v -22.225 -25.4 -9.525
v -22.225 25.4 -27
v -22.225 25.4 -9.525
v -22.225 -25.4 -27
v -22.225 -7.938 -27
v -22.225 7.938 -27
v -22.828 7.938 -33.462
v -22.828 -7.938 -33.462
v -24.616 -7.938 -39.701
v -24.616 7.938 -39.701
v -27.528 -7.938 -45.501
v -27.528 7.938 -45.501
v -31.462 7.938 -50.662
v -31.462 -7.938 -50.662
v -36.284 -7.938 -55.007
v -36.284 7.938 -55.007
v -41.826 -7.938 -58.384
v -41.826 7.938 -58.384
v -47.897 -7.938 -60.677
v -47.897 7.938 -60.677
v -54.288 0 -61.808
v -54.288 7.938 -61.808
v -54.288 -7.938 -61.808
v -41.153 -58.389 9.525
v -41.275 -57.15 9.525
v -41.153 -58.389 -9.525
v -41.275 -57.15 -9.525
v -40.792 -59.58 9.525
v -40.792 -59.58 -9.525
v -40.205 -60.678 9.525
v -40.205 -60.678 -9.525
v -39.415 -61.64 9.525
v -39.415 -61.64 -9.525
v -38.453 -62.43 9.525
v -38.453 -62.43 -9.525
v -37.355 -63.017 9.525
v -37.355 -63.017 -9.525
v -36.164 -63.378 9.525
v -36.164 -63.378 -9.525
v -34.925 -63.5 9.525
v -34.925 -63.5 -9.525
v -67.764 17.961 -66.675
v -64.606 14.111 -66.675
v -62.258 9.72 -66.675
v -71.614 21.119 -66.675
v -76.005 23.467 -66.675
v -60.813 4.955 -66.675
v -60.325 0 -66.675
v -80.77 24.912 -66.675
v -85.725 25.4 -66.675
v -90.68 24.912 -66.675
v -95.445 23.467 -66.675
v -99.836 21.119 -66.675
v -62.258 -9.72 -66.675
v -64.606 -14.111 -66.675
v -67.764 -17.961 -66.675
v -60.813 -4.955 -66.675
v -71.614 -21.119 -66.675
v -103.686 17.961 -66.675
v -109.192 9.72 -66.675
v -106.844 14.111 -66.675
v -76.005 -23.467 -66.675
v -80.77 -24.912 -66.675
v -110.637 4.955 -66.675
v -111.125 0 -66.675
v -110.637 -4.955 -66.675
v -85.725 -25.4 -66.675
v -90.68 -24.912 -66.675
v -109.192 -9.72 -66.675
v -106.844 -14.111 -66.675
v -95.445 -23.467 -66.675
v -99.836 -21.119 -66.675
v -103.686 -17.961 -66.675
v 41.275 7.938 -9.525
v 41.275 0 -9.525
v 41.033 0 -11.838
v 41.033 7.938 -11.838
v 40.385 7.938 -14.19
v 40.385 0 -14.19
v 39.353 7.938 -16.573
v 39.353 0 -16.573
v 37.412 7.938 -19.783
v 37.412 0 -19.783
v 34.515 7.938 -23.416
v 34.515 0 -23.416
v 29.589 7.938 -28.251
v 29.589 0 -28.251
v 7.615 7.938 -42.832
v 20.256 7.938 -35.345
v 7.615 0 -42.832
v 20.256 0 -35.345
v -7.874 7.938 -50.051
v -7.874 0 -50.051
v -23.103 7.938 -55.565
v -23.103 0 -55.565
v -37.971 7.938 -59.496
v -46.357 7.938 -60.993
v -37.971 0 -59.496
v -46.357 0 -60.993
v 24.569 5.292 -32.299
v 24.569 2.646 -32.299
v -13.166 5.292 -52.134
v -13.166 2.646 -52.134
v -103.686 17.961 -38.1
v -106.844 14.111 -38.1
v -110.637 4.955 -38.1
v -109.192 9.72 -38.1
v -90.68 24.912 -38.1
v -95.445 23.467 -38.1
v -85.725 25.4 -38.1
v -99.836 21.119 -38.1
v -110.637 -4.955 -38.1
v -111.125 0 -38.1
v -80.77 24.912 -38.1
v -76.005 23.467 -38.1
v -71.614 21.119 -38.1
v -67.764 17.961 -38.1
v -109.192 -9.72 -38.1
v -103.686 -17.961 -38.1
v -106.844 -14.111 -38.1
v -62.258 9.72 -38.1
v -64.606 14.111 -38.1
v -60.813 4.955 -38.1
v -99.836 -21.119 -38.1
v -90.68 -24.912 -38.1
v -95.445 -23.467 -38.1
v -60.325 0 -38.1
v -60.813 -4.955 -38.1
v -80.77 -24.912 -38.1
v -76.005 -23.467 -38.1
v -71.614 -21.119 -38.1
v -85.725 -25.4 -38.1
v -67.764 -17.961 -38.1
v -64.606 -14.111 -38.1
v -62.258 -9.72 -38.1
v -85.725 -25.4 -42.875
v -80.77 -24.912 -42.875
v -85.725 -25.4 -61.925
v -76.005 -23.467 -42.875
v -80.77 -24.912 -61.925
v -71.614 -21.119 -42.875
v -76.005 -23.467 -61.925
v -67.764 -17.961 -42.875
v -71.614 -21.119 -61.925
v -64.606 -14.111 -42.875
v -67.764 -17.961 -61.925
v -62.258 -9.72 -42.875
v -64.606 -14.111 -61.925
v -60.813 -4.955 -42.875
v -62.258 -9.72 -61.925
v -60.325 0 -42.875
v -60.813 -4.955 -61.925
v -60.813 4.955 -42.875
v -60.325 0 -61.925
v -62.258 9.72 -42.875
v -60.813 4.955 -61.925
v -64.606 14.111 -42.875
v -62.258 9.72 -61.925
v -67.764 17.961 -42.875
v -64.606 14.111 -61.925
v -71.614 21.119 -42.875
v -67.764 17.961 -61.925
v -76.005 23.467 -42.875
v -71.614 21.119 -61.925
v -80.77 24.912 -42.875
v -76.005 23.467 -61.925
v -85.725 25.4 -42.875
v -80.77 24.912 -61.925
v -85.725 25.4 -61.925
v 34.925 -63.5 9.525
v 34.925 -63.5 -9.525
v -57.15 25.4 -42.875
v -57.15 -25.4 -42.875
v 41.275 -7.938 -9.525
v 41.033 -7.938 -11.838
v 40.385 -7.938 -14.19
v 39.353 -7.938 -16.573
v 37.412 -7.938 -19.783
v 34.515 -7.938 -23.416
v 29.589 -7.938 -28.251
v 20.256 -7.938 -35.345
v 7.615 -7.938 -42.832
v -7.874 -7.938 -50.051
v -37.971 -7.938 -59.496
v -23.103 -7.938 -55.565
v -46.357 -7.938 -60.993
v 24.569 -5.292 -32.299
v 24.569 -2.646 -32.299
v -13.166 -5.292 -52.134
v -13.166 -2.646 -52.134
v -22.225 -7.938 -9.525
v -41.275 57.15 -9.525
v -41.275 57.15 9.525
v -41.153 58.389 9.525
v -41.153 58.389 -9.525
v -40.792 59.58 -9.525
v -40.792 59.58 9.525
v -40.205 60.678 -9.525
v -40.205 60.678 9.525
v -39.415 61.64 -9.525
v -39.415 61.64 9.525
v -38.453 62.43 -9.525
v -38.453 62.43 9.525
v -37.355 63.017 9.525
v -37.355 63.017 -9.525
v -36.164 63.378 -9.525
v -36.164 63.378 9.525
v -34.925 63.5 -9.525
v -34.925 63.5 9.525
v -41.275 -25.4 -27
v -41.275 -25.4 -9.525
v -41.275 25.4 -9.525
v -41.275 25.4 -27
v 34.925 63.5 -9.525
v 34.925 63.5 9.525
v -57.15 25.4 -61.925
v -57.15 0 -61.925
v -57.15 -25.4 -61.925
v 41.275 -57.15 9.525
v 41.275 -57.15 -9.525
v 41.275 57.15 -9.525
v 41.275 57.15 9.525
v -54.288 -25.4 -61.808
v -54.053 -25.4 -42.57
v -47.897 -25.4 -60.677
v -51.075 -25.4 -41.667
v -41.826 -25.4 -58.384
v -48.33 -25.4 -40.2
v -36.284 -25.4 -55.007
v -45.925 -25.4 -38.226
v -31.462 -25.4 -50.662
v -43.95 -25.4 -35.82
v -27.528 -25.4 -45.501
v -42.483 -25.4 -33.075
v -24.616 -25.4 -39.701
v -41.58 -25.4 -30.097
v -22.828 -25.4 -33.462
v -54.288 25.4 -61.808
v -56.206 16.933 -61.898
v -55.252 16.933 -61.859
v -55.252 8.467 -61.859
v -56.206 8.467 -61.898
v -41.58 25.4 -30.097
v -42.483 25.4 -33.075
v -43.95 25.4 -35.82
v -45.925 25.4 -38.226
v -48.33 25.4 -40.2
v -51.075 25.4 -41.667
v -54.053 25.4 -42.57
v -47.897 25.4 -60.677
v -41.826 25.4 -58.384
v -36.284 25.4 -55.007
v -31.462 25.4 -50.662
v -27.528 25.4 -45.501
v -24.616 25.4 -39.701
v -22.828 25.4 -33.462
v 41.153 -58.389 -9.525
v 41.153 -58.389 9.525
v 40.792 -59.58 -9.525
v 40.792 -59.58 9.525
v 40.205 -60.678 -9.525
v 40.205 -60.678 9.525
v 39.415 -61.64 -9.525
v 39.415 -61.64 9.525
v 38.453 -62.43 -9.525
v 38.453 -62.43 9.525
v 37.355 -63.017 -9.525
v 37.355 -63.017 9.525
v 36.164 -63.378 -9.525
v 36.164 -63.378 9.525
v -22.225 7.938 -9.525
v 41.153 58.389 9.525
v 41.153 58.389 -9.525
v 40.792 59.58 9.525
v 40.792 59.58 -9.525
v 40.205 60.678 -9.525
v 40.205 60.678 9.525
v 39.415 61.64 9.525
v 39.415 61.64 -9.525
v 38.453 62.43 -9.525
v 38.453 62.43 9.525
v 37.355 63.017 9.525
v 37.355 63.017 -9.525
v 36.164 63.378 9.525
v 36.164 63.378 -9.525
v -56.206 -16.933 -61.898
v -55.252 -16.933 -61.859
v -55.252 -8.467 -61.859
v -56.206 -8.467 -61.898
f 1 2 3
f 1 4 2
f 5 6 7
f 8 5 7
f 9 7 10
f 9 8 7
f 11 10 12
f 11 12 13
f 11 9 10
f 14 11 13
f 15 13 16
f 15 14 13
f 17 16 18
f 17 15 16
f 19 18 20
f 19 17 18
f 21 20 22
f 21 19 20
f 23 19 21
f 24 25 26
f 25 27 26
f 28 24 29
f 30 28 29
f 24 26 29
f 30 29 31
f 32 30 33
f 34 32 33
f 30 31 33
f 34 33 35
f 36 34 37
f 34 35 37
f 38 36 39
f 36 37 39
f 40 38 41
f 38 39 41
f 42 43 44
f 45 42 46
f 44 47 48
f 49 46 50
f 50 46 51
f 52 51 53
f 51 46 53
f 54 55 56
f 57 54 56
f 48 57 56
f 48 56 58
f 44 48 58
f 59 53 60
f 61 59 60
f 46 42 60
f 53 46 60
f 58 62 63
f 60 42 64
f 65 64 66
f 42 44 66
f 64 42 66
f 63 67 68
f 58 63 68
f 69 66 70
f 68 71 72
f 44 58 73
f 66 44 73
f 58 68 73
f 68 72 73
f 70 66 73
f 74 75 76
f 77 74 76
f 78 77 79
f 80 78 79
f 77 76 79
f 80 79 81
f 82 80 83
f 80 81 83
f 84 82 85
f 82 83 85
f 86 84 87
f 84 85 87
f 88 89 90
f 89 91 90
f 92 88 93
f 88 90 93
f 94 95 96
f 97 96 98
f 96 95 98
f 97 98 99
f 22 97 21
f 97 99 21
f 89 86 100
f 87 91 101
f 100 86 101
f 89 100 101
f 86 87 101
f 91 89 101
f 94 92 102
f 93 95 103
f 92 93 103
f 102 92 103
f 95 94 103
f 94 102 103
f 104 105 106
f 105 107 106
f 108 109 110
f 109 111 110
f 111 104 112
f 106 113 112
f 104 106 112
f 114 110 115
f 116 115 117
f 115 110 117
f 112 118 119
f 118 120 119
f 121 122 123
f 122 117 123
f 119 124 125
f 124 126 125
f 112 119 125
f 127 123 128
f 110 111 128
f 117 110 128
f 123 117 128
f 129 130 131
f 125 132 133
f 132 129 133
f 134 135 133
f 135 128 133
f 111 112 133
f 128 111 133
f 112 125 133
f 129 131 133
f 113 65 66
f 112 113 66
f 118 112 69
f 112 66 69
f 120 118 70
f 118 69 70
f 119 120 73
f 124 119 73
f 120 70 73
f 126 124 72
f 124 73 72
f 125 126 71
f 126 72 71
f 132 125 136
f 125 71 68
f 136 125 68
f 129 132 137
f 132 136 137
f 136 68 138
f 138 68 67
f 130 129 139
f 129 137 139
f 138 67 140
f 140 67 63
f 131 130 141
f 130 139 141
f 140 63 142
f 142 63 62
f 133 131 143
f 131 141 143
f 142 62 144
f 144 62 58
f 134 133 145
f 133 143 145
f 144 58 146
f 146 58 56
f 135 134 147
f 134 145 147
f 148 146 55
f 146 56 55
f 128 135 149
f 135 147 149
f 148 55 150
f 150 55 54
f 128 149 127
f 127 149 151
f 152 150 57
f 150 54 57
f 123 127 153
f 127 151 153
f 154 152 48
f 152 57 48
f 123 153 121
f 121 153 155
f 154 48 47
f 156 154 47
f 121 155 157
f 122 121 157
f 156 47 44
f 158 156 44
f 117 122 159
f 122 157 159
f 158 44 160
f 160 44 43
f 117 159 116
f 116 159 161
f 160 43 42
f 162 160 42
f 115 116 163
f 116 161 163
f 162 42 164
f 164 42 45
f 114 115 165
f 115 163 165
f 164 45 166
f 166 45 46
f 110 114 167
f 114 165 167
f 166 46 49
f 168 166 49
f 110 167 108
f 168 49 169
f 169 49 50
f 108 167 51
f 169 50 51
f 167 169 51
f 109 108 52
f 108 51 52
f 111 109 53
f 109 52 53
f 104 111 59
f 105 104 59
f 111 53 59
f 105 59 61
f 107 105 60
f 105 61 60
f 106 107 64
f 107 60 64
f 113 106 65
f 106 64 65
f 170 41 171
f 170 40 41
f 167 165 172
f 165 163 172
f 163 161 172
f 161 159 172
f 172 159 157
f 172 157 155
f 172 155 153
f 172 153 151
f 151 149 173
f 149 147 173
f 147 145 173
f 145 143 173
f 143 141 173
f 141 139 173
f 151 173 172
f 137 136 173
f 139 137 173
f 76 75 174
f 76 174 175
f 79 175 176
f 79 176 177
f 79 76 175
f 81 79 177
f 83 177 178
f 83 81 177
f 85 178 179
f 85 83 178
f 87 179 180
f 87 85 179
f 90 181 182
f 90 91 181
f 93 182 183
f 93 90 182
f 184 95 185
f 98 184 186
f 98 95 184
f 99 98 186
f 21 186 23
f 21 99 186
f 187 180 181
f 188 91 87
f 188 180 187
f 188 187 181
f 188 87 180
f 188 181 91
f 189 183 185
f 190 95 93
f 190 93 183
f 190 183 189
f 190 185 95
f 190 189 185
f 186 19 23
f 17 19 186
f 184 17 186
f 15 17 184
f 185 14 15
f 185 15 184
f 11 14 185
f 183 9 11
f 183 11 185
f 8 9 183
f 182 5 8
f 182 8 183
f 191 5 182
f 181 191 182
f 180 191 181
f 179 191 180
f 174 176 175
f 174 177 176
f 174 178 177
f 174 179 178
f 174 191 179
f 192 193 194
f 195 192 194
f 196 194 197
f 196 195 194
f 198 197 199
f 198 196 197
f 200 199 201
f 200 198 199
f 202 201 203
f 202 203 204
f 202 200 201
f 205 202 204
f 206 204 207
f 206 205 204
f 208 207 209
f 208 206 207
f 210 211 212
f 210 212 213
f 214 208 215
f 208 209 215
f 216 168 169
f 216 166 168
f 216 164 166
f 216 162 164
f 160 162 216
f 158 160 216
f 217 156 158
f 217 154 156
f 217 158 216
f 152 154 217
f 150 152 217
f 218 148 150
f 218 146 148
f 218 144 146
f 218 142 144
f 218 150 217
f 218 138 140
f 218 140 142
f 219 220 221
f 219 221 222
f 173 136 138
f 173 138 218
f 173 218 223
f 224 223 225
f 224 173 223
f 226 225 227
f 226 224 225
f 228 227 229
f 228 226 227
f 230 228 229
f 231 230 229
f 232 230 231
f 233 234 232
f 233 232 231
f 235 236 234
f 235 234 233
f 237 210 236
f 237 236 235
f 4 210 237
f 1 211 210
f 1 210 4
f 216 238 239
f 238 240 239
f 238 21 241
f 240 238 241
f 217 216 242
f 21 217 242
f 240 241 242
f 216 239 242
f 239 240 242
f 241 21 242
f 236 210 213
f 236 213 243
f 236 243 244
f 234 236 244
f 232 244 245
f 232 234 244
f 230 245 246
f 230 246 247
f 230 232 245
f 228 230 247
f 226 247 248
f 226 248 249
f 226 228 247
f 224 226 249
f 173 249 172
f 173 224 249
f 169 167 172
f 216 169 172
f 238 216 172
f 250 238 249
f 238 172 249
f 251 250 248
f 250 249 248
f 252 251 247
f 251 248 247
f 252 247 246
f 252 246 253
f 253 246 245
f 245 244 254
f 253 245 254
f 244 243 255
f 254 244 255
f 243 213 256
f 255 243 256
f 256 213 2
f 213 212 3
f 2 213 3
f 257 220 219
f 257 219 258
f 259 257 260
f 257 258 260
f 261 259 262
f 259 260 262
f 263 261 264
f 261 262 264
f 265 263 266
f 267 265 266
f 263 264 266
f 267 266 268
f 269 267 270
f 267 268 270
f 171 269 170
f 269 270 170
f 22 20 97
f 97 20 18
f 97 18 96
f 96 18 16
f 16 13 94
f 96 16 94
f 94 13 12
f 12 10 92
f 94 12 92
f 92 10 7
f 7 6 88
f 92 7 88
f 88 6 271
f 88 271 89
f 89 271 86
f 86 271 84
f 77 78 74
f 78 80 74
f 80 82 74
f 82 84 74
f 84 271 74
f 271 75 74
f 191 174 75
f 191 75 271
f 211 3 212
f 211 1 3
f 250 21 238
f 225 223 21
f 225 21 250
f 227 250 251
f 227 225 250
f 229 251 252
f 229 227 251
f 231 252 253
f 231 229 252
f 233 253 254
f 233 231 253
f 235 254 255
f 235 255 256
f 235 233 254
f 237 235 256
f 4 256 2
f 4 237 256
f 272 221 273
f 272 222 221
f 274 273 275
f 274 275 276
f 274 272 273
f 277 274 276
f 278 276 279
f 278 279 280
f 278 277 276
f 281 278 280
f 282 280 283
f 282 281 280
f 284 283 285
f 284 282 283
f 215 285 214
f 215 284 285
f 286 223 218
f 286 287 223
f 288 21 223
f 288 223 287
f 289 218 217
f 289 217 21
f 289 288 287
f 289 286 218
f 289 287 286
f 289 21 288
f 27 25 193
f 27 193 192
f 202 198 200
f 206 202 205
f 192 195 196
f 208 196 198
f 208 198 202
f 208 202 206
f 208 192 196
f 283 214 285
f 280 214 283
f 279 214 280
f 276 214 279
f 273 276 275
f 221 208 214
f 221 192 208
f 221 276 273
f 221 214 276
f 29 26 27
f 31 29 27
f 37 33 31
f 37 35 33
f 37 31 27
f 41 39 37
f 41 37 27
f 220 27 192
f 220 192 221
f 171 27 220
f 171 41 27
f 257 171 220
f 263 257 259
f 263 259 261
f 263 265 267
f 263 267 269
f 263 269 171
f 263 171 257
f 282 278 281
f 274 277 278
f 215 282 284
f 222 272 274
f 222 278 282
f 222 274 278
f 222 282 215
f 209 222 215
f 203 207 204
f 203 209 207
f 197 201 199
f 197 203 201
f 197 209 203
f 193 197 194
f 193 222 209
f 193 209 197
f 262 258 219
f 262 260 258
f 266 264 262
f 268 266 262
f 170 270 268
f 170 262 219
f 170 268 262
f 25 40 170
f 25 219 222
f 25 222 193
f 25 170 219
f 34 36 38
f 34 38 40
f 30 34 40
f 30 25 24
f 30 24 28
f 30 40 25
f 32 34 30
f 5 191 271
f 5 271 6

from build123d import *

# Parameters (mm, degrees)
F1_DEPTH = 63.5
F2_DEPTH = 25.4
F0_W     = 25.4
F0_H     = 19.05
F3_DEPTH = 25.4
F4_DEPTH = 7.9375
F6_R     = 6.35


with BuildPart() as f1:
    # F0 (on Front) → F1 (new body, symmetric)
    with BuildSketch(Plane.XZ):
        Polygon((-41.275, 9.525), (-41.275, -9.525), (-22.225, -9.525), (41.275, -9.525), (41.275, 9.525), align=None)
    extrude(amount=F1_DEPTH, both=True)

    # F6
    f6_edges = [f1.edges().sort_by_distance(p)[0] for p in [
        (41.275, -63.5, 0),
        (-41.275, -63.5, 0),
        (-41.275, 63.5, 0),
        (41.275, 63.5, 0),
    ]]
    fillet(f6_edges, radius=F6_R)


with BuildPart() as f2:
    # F0 (on Front) → F2 (new body, symmetric)
    with BuildSketch(Plane.XZ):
        with BuildLine():
            Line((-22.225, -9.525), (-41.275, -9.525))
            Line((-41.275, -9.525), (-41.275, -27.0002))
            ThreePointArc((-41.275, -27.0002), (-45.9246798487, -38.2255201513), (-57.15, -42.8752))
            Line((-57.15, -42.8752), (-60.325, -42.8752))
            Line((-60.325, -42.8752), (-60.325, -61.9252))
            Line((-60.325, -61.9252), (-57.15, -61.9252))
            add(Edge.make_bspline(
                [(-54.2877913944, -61.8077191144), (-55.2570624303, -61.8650354443), (-56.2116101658, -61.9043915786), (-57.15, -61.9252)],
                knots=[108.6532371743, 108.6532371743, 108.6532371743, 108.6532371743, 111.5045361635, 111.5045361635, 111.5045361635, 111.5045361635], degree=3))
            ThreePointArc((-54.2877913944, -61.8077191144), (-31.4622766623, -50.6623320832), (-22.225, -27.0002))
            Line((-22.225, -27.0002), (-22.225, -9.525))
        make_face()
    extrude(amount=F2_DEPTH, both=True)

    # F0 (on Front) → F3 (join, symmetric)
    with BuildSketch(Plane.XZ):
        with Locations((-73.025, -52.4002)):
            Rectangle(F0_W, F0_H)
    extrude(amount=F3_DEPTH, both=True)

    # F0 (on Front) → F5 (revolve)
    with BuildSketch(Plane.XZ):
        Polygon((-85.725, -61.9252), (-85.725, -42.8752), (-85.725, -38.1), (-111.125, -38.1), (-111.125, -66.675), (-85.725, -66.675), align=None)
    revolve(axis=Axis((-85.725, 0, -52.3875), (0, 0, 1)))


with BuildPart() as f4:
    # F0 (on Front) → F4 (new body, symmetric)
    with BuildSketch(Plane.XZ):
        with BuildLine():
            Line((41.275, -9.525), (-22.225, -9.525))
            Line((-22.225, -9.525), (-22.225, -27.0002))
            ThreePointArc((-22.225, -27.0002), (-31.4622766623, -50.6623320832), (-54.2877913944, -61.8077191144))
            add(Edge.make_bspline(
                [(41.275, -9.525), (40.9632731534, -31.3592633093), (-17.3521925131, -59.6235901224), (-54.2877913944, -61.8077191144)],
                knots=[0, 0, 0, 0, 108.6532371743, 108.6532371743, 108.6532371743, 108.6532371743], degree=3))
        make_face()
    extrude(amount=F4_DEPTH, both=True)


solid = Compound([f1.part, f2.part, f4.part])
